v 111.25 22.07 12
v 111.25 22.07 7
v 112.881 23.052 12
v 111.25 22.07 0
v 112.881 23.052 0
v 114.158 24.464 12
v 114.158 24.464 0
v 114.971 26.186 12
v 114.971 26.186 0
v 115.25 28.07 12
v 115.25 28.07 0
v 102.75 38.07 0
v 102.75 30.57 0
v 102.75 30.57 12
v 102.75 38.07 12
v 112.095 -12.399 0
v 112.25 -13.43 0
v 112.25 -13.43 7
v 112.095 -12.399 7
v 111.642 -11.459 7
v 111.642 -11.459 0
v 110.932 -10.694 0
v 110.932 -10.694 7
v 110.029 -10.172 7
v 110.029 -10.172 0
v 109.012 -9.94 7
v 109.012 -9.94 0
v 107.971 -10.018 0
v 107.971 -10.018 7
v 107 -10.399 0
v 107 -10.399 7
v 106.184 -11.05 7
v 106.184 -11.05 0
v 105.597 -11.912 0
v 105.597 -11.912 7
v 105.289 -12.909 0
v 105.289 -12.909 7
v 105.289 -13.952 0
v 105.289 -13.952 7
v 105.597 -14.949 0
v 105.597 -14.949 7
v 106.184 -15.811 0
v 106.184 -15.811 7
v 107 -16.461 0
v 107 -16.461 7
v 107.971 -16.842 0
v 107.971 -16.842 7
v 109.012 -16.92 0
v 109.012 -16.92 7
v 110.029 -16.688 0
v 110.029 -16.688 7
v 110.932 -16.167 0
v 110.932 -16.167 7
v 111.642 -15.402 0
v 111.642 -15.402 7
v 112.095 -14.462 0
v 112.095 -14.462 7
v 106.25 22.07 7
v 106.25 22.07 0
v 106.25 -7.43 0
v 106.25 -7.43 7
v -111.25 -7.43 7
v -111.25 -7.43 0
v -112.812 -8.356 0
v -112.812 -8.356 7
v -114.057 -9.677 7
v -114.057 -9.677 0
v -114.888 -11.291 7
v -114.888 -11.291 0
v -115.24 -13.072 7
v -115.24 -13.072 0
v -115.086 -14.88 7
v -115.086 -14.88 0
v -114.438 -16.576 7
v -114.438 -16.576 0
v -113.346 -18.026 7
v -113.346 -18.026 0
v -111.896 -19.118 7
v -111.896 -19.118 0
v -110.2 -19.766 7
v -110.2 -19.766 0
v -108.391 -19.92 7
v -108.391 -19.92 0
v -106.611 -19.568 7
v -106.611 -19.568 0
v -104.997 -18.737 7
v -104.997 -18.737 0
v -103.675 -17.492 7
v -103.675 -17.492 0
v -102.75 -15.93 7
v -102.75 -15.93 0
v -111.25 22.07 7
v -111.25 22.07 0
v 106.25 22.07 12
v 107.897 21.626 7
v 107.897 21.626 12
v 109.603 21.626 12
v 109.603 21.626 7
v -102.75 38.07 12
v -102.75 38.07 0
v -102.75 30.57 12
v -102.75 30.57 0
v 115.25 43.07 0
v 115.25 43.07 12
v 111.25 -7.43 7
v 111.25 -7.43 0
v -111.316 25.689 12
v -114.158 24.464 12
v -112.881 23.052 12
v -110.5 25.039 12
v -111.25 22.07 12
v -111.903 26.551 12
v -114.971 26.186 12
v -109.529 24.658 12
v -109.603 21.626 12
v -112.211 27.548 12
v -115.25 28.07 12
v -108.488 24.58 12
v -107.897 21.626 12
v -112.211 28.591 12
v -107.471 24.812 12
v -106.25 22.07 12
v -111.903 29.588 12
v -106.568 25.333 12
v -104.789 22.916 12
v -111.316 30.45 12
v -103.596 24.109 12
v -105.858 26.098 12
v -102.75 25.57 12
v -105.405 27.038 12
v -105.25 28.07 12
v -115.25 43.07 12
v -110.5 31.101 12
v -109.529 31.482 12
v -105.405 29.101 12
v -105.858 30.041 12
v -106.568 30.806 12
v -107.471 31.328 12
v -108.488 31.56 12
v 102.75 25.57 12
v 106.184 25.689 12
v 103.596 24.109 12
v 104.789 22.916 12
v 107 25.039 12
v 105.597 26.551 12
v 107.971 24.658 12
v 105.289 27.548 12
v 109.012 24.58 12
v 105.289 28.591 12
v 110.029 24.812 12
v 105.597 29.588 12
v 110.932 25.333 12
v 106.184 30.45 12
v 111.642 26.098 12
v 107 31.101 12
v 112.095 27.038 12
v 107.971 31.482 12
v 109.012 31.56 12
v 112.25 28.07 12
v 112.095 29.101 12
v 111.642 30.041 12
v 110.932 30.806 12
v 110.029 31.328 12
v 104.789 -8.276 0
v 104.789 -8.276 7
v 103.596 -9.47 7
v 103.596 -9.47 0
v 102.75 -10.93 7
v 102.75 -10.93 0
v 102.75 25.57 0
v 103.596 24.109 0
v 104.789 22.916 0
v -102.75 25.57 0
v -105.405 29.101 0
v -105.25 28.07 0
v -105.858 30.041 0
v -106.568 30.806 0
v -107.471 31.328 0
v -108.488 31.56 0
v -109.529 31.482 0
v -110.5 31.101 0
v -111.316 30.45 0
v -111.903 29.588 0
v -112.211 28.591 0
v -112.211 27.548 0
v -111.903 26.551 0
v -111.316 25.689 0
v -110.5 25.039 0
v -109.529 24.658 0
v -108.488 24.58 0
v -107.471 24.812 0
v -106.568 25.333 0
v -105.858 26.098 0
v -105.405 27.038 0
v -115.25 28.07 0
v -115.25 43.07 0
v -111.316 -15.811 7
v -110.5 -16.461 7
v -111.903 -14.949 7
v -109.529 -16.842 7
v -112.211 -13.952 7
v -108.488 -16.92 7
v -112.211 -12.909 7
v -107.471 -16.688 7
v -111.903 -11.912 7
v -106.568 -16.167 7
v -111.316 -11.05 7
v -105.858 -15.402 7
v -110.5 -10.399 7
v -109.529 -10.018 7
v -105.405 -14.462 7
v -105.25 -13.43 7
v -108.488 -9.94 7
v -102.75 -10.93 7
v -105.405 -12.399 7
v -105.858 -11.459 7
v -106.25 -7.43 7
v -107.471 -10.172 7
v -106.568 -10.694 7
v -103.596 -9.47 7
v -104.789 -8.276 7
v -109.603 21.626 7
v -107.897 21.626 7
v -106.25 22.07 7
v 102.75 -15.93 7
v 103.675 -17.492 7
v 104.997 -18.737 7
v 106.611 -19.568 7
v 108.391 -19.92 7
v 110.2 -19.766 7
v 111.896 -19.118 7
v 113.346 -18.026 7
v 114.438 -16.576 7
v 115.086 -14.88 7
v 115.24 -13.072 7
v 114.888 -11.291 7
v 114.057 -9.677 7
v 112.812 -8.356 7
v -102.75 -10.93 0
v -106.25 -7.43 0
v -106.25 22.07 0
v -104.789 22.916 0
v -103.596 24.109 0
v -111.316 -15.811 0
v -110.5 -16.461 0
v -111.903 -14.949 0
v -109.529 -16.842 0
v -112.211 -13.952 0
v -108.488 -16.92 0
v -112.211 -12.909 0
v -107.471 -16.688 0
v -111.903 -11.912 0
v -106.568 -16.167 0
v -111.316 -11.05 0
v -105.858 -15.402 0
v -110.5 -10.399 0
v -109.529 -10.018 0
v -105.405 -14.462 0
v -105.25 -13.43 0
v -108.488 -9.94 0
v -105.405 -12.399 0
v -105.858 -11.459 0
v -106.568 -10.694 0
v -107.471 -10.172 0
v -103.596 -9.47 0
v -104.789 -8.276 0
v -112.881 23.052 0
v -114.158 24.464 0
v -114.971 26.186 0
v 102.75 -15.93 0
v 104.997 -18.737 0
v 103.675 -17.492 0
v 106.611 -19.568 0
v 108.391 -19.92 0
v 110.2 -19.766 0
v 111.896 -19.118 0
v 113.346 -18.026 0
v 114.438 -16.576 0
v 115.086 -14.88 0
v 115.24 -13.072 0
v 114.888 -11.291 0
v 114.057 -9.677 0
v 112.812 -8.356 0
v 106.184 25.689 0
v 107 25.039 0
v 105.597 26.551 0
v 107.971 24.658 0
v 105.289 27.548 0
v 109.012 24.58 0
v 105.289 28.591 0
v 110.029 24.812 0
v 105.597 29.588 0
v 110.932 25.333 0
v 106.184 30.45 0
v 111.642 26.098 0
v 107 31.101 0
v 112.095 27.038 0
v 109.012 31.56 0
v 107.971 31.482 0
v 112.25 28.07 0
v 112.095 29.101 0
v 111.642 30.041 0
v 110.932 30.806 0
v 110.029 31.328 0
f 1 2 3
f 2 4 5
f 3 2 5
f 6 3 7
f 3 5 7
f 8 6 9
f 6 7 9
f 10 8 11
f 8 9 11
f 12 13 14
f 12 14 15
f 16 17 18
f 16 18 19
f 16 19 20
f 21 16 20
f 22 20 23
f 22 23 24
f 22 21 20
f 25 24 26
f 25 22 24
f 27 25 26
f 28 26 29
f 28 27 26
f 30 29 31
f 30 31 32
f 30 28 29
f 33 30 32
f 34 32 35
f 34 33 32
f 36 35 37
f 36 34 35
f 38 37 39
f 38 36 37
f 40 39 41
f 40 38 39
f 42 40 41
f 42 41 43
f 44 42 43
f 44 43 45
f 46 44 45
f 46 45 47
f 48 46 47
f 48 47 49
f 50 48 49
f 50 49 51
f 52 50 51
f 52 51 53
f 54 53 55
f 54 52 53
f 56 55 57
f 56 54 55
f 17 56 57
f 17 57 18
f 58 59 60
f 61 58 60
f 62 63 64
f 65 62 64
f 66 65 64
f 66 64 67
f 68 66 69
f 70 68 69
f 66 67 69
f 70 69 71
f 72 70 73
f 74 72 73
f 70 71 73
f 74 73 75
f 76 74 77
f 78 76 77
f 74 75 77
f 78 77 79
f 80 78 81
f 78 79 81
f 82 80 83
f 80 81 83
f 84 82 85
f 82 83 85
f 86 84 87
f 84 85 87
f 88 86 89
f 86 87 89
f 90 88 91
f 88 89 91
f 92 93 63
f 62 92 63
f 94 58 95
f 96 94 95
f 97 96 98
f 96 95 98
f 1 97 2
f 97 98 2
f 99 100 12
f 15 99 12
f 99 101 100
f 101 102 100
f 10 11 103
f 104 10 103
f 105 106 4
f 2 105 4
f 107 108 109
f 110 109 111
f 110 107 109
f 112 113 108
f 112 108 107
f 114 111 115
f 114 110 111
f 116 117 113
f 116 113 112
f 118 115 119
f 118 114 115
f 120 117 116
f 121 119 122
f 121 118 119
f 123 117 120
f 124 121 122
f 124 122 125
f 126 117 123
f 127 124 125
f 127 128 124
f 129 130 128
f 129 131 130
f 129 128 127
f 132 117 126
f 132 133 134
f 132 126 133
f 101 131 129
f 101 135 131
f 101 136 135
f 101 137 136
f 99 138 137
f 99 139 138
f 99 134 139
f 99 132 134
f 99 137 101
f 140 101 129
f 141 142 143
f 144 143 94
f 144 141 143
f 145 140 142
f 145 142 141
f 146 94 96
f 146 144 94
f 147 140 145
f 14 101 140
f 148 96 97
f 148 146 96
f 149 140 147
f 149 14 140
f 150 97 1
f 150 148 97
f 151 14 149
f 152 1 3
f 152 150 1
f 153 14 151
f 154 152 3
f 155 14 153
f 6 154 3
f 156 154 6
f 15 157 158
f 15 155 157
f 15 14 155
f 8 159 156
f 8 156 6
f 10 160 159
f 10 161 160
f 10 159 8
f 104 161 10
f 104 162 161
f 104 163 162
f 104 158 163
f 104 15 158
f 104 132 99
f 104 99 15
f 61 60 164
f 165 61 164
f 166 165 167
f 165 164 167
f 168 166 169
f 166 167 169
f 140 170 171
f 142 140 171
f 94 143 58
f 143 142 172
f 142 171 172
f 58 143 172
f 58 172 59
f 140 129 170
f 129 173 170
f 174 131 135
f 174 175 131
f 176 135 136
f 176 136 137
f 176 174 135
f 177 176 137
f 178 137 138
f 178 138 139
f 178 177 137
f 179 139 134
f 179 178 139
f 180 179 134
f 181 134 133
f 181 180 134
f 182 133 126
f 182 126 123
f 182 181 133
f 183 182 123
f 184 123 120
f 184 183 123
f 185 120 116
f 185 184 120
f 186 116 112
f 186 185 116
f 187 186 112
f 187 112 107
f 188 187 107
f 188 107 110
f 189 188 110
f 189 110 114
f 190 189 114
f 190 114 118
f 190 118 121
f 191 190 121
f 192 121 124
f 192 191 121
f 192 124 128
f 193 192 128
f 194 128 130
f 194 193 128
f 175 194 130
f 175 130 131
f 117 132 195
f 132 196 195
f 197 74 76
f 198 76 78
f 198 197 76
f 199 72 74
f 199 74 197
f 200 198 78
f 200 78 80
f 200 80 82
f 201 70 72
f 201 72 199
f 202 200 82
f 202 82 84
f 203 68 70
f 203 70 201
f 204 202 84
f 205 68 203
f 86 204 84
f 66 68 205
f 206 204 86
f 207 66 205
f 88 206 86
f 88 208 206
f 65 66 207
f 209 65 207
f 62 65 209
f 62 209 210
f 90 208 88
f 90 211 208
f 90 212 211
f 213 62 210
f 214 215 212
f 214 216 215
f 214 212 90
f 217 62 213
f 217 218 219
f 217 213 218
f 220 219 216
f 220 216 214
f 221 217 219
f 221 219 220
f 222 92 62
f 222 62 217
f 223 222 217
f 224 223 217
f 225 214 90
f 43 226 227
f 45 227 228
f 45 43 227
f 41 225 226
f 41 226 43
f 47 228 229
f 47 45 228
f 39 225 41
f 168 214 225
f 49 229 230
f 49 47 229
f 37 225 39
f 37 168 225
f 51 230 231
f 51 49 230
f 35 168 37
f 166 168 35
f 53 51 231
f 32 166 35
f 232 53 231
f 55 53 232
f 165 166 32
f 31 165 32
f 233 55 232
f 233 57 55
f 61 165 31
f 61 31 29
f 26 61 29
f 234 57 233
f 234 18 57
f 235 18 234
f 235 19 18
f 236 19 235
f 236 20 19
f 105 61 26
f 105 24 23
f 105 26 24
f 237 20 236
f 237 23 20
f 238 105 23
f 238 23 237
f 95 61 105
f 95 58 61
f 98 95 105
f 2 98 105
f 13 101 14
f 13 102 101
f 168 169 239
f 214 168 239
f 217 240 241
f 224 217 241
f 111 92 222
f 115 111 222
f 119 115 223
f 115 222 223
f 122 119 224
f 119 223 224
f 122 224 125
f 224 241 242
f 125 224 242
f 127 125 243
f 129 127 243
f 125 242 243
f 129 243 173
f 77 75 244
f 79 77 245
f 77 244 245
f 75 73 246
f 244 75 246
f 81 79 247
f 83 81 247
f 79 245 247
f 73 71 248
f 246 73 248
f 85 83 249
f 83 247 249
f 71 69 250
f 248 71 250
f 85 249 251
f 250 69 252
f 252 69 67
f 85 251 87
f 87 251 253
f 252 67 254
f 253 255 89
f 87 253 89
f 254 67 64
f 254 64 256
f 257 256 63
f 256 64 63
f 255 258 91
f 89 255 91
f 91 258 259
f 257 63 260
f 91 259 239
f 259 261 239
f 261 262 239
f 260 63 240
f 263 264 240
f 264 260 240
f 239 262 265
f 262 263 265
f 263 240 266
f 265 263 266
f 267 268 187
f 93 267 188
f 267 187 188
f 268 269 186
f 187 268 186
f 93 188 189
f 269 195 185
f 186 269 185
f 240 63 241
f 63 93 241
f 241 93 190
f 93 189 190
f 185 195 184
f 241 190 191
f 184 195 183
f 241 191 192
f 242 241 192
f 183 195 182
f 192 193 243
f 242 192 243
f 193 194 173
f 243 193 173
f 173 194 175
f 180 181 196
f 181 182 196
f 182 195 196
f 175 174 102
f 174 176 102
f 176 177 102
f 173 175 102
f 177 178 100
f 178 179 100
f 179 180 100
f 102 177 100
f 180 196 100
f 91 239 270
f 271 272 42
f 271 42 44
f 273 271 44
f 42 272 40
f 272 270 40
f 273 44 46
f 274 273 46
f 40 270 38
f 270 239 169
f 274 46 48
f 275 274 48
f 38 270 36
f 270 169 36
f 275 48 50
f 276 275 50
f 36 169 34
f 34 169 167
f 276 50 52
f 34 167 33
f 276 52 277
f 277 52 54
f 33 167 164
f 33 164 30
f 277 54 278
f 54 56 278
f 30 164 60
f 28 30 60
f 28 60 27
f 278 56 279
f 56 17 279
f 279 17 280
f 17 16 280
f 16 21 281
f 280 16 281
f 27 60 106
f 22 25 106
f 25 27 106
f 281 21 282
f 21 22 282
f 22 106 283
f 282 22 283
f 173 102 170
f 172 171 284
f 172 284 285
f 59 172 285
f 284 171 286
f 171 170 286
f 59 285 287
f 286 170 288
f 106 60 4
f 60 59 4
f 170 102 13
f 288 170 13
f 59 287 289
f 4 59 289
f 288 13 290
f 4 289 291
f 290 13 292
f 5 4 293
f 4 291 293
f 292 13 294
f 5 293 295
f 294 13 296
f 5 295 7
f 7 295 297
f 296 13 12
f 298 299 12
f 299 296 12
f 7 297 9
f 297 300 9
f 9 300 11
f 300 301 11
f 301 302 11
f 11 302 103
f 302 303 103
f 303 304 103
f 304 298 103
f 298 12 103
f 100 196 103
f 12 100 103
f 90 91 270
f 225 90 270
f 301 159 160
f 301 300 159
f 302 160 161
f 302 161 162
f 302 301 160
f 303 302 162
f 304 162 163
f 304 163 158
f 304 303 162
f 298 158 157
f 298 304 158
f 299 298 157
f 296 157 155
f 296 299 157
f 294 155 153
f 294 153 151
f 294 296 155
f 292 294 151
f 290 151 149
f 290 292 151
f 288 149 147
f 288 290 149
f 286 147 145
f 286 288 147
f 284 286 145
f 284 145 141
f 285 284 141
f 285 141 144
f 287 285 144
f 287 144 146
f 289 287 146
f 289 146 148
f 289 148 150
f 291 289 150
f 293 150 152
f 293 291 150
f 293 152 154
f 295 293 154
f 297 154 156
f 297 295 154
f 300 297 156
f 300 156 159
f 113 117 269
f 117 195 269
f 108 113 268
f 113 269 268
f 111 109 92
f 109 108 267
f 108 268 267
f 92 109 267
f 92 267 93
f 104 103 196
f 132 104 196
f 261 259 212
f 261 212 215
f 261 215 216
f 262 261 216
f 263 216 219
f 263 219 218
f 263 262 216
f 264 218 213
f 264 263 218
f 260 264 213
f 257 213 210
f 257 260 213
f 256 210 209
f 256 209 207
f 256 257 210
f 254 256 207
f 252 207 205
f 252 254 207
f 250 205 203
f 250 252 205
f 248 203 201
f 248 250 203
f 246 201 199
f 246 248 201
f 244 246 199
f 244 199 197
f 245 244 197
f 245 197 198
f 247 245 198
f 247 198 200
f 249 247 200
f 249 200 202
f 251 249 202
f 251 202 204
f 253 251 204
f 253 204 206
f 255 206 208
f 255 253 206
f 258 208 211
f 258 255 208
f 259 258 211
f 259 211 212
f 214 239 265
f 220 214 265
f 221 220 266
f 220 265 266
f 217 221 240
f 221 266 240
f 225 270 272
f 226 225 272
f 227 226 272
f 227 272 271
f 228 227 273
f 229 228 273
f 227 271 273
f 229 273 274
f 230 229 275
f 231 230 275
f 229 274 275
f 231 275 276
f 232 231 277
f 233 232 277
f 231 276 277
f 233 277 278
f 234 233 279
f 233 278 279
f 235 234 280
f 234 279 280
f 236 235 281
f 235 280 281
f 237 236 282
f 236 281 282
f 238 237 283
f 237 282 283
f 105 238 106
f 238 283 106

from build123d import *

# Parameters (mm, degrees)
F0_R     = 3.5
F0_W     = 205.5
F0_H     = 7.5
F1_DEPTH = 7
F2_R     = 3.5
F2_W     = 205.5
F2_H     = 7.5
F3_DEPTH = 5


# Not quite as in the source:
# - a feature of the source that left no trace in its solid (it failed there, or was rolled back) is left out


with BuildPart() as f1:
    # F0 (on Top) → F1 (new body)
    with BuildSketch(Plane.XY):
        with BuildLine():
            Line((-115.25, 43.0697486343), (-115.25, 28.0697486343))
            ThreePointArc((-115.25, 28.0697486343), (-114.1583269132, 24.4641973588), (-111.25, 22.0697486343))
            Line((-111.25, 22.0697486343), (-111.25, -7.4302513657))
            ThreePointArc((-111.25, -7.4302513657), (-113.3461940777, -18.0264454434), (-102.75, -15.9302513657))
            Line((-102.75, -15.9302513657), (102.75, -15.9302513657))
            ThreePointArc((102.75, -15.9302513657), (113.3461940777, -18.0264454434), (111.25, -7.4302513657))
            Line((111.25, -7.4302513657), (111.25, 22.0697486343))
            ThreePointArc((111.25, 22.0697486343), (114.1583269132, 24.4641973588), (115.25, 28.0697486343))
            Line((115.25, 28.0697486343), (115.25, 43.0697486343))
            Line((115.25, 43.0697486343), (-115.25, 43.0697486343))
        make_face()
        with Locations((-108.75, -13.4302513657)):
            Circle(F0_R, mode=Mode.SUBTRACT)
        with Locations((108.75, -13.4302513657)):
            Circle(F0_R, mode=Mode.SUBTRACT)
        with BuildLine():
            Line((-102.75, 25.5697486343), (102.75, 25.5697486343))
            ThreePointArc((102.75, 25.5697486343), (104.1538059223, 23.4735545566), (106.25, 22.0697486343))
            Line((106.25, 22.0697486343), (106.25, -7.4302513657))
            ThreePointArc((106.25, -7.4302513657), (104.1538059223, -8.834057288), (102.75, -10.9302513657))
            Line((102.75, -10.9302513657), (-102.75, -10.9302513657))
            ThreePointArc((-102.75, -10.9302513657), (-104.1538059223, -8.834057288), (-106.25, -7.4302513657))
            Line((-106.25, -7.4302513657), (-106.25, 22.0697486343))
            ThreePointArc((-106.25, 22.0697486343), (-104.1538059223, 23.4735545566), (-102.75, 25.5697486343))
        make_face(mode=Mode.SUBTRACT)
        with Locations((-108.75, 28.0697486343)):
            Circle(F0_R, mode=Mode.SUBTRACT)
        with Locations((0, 34.3197486343)):
            Rectangle(F0_W, F0_H, mode=Mode.SUBTRACT)
        with Locations((108.75, 28.0697486343)):
            Circle(F0_R, mode=Mode.SUBTRACT)
    extrude(amount=F1_DEPTH)

    # F2 (on face) → F3 (join)
    with BuildSketch(Plane.XY.offset(7)):
        with BuildLine():
            Line((115.25, 43.0697486343), (-115.25, 43.0697486343))
            Line((-115.25, 43.0697486343), (-115.25, 28.0697486343))
            ThreePointArc((-115.25, 28.0697486343), (-114.1583269132, 24.4641973588), (-111.25, 22.0697486343))
            ThreePointArc((-111.25, 22.0697486343), (-108.75, 21.5697486343), (-106.25, 22.0697486343))
            ThreePointArc((-106.25, 22.0697486343), (-104.1538059223, 23.4735545566), (-102.75, 25.5697486343))
            Line((-102.75, 25.5697486343), (102.75, 25.5697486343))
            ThreePointArc((102.75, 25.5697486343), (104.1538059223, 23.4735545566), (106.25, 22.0697486343))
            ThreePointArc((106.25, 22.0697486343), (108.75, 21.5697486343), (111.25, 22.0697486343))
            ThreePointArc((111.25, 22.0697486343), (114.1583269132, 24.4641973588), (115.25, 28.0697486343))
            Line((115.25, 28.0697486343), (115.25, 43.0697486343))
        make_face()
        with Locations((-108.75, 28.0697486343)):
            Circle(F2_R, mode=Mode.SUBTRACT)
        with Locations((108.75, 28.0697486343)):
            Circle(F2_R, mode=Mode.SUBTRACT)
        with Locations((0, 34.3197486343)):
            Rectangle(F2_W, F2_H, mode=Mode.SUBTRACT)
    extrude(amount=F3_DEPTH)


solid = f1.part
